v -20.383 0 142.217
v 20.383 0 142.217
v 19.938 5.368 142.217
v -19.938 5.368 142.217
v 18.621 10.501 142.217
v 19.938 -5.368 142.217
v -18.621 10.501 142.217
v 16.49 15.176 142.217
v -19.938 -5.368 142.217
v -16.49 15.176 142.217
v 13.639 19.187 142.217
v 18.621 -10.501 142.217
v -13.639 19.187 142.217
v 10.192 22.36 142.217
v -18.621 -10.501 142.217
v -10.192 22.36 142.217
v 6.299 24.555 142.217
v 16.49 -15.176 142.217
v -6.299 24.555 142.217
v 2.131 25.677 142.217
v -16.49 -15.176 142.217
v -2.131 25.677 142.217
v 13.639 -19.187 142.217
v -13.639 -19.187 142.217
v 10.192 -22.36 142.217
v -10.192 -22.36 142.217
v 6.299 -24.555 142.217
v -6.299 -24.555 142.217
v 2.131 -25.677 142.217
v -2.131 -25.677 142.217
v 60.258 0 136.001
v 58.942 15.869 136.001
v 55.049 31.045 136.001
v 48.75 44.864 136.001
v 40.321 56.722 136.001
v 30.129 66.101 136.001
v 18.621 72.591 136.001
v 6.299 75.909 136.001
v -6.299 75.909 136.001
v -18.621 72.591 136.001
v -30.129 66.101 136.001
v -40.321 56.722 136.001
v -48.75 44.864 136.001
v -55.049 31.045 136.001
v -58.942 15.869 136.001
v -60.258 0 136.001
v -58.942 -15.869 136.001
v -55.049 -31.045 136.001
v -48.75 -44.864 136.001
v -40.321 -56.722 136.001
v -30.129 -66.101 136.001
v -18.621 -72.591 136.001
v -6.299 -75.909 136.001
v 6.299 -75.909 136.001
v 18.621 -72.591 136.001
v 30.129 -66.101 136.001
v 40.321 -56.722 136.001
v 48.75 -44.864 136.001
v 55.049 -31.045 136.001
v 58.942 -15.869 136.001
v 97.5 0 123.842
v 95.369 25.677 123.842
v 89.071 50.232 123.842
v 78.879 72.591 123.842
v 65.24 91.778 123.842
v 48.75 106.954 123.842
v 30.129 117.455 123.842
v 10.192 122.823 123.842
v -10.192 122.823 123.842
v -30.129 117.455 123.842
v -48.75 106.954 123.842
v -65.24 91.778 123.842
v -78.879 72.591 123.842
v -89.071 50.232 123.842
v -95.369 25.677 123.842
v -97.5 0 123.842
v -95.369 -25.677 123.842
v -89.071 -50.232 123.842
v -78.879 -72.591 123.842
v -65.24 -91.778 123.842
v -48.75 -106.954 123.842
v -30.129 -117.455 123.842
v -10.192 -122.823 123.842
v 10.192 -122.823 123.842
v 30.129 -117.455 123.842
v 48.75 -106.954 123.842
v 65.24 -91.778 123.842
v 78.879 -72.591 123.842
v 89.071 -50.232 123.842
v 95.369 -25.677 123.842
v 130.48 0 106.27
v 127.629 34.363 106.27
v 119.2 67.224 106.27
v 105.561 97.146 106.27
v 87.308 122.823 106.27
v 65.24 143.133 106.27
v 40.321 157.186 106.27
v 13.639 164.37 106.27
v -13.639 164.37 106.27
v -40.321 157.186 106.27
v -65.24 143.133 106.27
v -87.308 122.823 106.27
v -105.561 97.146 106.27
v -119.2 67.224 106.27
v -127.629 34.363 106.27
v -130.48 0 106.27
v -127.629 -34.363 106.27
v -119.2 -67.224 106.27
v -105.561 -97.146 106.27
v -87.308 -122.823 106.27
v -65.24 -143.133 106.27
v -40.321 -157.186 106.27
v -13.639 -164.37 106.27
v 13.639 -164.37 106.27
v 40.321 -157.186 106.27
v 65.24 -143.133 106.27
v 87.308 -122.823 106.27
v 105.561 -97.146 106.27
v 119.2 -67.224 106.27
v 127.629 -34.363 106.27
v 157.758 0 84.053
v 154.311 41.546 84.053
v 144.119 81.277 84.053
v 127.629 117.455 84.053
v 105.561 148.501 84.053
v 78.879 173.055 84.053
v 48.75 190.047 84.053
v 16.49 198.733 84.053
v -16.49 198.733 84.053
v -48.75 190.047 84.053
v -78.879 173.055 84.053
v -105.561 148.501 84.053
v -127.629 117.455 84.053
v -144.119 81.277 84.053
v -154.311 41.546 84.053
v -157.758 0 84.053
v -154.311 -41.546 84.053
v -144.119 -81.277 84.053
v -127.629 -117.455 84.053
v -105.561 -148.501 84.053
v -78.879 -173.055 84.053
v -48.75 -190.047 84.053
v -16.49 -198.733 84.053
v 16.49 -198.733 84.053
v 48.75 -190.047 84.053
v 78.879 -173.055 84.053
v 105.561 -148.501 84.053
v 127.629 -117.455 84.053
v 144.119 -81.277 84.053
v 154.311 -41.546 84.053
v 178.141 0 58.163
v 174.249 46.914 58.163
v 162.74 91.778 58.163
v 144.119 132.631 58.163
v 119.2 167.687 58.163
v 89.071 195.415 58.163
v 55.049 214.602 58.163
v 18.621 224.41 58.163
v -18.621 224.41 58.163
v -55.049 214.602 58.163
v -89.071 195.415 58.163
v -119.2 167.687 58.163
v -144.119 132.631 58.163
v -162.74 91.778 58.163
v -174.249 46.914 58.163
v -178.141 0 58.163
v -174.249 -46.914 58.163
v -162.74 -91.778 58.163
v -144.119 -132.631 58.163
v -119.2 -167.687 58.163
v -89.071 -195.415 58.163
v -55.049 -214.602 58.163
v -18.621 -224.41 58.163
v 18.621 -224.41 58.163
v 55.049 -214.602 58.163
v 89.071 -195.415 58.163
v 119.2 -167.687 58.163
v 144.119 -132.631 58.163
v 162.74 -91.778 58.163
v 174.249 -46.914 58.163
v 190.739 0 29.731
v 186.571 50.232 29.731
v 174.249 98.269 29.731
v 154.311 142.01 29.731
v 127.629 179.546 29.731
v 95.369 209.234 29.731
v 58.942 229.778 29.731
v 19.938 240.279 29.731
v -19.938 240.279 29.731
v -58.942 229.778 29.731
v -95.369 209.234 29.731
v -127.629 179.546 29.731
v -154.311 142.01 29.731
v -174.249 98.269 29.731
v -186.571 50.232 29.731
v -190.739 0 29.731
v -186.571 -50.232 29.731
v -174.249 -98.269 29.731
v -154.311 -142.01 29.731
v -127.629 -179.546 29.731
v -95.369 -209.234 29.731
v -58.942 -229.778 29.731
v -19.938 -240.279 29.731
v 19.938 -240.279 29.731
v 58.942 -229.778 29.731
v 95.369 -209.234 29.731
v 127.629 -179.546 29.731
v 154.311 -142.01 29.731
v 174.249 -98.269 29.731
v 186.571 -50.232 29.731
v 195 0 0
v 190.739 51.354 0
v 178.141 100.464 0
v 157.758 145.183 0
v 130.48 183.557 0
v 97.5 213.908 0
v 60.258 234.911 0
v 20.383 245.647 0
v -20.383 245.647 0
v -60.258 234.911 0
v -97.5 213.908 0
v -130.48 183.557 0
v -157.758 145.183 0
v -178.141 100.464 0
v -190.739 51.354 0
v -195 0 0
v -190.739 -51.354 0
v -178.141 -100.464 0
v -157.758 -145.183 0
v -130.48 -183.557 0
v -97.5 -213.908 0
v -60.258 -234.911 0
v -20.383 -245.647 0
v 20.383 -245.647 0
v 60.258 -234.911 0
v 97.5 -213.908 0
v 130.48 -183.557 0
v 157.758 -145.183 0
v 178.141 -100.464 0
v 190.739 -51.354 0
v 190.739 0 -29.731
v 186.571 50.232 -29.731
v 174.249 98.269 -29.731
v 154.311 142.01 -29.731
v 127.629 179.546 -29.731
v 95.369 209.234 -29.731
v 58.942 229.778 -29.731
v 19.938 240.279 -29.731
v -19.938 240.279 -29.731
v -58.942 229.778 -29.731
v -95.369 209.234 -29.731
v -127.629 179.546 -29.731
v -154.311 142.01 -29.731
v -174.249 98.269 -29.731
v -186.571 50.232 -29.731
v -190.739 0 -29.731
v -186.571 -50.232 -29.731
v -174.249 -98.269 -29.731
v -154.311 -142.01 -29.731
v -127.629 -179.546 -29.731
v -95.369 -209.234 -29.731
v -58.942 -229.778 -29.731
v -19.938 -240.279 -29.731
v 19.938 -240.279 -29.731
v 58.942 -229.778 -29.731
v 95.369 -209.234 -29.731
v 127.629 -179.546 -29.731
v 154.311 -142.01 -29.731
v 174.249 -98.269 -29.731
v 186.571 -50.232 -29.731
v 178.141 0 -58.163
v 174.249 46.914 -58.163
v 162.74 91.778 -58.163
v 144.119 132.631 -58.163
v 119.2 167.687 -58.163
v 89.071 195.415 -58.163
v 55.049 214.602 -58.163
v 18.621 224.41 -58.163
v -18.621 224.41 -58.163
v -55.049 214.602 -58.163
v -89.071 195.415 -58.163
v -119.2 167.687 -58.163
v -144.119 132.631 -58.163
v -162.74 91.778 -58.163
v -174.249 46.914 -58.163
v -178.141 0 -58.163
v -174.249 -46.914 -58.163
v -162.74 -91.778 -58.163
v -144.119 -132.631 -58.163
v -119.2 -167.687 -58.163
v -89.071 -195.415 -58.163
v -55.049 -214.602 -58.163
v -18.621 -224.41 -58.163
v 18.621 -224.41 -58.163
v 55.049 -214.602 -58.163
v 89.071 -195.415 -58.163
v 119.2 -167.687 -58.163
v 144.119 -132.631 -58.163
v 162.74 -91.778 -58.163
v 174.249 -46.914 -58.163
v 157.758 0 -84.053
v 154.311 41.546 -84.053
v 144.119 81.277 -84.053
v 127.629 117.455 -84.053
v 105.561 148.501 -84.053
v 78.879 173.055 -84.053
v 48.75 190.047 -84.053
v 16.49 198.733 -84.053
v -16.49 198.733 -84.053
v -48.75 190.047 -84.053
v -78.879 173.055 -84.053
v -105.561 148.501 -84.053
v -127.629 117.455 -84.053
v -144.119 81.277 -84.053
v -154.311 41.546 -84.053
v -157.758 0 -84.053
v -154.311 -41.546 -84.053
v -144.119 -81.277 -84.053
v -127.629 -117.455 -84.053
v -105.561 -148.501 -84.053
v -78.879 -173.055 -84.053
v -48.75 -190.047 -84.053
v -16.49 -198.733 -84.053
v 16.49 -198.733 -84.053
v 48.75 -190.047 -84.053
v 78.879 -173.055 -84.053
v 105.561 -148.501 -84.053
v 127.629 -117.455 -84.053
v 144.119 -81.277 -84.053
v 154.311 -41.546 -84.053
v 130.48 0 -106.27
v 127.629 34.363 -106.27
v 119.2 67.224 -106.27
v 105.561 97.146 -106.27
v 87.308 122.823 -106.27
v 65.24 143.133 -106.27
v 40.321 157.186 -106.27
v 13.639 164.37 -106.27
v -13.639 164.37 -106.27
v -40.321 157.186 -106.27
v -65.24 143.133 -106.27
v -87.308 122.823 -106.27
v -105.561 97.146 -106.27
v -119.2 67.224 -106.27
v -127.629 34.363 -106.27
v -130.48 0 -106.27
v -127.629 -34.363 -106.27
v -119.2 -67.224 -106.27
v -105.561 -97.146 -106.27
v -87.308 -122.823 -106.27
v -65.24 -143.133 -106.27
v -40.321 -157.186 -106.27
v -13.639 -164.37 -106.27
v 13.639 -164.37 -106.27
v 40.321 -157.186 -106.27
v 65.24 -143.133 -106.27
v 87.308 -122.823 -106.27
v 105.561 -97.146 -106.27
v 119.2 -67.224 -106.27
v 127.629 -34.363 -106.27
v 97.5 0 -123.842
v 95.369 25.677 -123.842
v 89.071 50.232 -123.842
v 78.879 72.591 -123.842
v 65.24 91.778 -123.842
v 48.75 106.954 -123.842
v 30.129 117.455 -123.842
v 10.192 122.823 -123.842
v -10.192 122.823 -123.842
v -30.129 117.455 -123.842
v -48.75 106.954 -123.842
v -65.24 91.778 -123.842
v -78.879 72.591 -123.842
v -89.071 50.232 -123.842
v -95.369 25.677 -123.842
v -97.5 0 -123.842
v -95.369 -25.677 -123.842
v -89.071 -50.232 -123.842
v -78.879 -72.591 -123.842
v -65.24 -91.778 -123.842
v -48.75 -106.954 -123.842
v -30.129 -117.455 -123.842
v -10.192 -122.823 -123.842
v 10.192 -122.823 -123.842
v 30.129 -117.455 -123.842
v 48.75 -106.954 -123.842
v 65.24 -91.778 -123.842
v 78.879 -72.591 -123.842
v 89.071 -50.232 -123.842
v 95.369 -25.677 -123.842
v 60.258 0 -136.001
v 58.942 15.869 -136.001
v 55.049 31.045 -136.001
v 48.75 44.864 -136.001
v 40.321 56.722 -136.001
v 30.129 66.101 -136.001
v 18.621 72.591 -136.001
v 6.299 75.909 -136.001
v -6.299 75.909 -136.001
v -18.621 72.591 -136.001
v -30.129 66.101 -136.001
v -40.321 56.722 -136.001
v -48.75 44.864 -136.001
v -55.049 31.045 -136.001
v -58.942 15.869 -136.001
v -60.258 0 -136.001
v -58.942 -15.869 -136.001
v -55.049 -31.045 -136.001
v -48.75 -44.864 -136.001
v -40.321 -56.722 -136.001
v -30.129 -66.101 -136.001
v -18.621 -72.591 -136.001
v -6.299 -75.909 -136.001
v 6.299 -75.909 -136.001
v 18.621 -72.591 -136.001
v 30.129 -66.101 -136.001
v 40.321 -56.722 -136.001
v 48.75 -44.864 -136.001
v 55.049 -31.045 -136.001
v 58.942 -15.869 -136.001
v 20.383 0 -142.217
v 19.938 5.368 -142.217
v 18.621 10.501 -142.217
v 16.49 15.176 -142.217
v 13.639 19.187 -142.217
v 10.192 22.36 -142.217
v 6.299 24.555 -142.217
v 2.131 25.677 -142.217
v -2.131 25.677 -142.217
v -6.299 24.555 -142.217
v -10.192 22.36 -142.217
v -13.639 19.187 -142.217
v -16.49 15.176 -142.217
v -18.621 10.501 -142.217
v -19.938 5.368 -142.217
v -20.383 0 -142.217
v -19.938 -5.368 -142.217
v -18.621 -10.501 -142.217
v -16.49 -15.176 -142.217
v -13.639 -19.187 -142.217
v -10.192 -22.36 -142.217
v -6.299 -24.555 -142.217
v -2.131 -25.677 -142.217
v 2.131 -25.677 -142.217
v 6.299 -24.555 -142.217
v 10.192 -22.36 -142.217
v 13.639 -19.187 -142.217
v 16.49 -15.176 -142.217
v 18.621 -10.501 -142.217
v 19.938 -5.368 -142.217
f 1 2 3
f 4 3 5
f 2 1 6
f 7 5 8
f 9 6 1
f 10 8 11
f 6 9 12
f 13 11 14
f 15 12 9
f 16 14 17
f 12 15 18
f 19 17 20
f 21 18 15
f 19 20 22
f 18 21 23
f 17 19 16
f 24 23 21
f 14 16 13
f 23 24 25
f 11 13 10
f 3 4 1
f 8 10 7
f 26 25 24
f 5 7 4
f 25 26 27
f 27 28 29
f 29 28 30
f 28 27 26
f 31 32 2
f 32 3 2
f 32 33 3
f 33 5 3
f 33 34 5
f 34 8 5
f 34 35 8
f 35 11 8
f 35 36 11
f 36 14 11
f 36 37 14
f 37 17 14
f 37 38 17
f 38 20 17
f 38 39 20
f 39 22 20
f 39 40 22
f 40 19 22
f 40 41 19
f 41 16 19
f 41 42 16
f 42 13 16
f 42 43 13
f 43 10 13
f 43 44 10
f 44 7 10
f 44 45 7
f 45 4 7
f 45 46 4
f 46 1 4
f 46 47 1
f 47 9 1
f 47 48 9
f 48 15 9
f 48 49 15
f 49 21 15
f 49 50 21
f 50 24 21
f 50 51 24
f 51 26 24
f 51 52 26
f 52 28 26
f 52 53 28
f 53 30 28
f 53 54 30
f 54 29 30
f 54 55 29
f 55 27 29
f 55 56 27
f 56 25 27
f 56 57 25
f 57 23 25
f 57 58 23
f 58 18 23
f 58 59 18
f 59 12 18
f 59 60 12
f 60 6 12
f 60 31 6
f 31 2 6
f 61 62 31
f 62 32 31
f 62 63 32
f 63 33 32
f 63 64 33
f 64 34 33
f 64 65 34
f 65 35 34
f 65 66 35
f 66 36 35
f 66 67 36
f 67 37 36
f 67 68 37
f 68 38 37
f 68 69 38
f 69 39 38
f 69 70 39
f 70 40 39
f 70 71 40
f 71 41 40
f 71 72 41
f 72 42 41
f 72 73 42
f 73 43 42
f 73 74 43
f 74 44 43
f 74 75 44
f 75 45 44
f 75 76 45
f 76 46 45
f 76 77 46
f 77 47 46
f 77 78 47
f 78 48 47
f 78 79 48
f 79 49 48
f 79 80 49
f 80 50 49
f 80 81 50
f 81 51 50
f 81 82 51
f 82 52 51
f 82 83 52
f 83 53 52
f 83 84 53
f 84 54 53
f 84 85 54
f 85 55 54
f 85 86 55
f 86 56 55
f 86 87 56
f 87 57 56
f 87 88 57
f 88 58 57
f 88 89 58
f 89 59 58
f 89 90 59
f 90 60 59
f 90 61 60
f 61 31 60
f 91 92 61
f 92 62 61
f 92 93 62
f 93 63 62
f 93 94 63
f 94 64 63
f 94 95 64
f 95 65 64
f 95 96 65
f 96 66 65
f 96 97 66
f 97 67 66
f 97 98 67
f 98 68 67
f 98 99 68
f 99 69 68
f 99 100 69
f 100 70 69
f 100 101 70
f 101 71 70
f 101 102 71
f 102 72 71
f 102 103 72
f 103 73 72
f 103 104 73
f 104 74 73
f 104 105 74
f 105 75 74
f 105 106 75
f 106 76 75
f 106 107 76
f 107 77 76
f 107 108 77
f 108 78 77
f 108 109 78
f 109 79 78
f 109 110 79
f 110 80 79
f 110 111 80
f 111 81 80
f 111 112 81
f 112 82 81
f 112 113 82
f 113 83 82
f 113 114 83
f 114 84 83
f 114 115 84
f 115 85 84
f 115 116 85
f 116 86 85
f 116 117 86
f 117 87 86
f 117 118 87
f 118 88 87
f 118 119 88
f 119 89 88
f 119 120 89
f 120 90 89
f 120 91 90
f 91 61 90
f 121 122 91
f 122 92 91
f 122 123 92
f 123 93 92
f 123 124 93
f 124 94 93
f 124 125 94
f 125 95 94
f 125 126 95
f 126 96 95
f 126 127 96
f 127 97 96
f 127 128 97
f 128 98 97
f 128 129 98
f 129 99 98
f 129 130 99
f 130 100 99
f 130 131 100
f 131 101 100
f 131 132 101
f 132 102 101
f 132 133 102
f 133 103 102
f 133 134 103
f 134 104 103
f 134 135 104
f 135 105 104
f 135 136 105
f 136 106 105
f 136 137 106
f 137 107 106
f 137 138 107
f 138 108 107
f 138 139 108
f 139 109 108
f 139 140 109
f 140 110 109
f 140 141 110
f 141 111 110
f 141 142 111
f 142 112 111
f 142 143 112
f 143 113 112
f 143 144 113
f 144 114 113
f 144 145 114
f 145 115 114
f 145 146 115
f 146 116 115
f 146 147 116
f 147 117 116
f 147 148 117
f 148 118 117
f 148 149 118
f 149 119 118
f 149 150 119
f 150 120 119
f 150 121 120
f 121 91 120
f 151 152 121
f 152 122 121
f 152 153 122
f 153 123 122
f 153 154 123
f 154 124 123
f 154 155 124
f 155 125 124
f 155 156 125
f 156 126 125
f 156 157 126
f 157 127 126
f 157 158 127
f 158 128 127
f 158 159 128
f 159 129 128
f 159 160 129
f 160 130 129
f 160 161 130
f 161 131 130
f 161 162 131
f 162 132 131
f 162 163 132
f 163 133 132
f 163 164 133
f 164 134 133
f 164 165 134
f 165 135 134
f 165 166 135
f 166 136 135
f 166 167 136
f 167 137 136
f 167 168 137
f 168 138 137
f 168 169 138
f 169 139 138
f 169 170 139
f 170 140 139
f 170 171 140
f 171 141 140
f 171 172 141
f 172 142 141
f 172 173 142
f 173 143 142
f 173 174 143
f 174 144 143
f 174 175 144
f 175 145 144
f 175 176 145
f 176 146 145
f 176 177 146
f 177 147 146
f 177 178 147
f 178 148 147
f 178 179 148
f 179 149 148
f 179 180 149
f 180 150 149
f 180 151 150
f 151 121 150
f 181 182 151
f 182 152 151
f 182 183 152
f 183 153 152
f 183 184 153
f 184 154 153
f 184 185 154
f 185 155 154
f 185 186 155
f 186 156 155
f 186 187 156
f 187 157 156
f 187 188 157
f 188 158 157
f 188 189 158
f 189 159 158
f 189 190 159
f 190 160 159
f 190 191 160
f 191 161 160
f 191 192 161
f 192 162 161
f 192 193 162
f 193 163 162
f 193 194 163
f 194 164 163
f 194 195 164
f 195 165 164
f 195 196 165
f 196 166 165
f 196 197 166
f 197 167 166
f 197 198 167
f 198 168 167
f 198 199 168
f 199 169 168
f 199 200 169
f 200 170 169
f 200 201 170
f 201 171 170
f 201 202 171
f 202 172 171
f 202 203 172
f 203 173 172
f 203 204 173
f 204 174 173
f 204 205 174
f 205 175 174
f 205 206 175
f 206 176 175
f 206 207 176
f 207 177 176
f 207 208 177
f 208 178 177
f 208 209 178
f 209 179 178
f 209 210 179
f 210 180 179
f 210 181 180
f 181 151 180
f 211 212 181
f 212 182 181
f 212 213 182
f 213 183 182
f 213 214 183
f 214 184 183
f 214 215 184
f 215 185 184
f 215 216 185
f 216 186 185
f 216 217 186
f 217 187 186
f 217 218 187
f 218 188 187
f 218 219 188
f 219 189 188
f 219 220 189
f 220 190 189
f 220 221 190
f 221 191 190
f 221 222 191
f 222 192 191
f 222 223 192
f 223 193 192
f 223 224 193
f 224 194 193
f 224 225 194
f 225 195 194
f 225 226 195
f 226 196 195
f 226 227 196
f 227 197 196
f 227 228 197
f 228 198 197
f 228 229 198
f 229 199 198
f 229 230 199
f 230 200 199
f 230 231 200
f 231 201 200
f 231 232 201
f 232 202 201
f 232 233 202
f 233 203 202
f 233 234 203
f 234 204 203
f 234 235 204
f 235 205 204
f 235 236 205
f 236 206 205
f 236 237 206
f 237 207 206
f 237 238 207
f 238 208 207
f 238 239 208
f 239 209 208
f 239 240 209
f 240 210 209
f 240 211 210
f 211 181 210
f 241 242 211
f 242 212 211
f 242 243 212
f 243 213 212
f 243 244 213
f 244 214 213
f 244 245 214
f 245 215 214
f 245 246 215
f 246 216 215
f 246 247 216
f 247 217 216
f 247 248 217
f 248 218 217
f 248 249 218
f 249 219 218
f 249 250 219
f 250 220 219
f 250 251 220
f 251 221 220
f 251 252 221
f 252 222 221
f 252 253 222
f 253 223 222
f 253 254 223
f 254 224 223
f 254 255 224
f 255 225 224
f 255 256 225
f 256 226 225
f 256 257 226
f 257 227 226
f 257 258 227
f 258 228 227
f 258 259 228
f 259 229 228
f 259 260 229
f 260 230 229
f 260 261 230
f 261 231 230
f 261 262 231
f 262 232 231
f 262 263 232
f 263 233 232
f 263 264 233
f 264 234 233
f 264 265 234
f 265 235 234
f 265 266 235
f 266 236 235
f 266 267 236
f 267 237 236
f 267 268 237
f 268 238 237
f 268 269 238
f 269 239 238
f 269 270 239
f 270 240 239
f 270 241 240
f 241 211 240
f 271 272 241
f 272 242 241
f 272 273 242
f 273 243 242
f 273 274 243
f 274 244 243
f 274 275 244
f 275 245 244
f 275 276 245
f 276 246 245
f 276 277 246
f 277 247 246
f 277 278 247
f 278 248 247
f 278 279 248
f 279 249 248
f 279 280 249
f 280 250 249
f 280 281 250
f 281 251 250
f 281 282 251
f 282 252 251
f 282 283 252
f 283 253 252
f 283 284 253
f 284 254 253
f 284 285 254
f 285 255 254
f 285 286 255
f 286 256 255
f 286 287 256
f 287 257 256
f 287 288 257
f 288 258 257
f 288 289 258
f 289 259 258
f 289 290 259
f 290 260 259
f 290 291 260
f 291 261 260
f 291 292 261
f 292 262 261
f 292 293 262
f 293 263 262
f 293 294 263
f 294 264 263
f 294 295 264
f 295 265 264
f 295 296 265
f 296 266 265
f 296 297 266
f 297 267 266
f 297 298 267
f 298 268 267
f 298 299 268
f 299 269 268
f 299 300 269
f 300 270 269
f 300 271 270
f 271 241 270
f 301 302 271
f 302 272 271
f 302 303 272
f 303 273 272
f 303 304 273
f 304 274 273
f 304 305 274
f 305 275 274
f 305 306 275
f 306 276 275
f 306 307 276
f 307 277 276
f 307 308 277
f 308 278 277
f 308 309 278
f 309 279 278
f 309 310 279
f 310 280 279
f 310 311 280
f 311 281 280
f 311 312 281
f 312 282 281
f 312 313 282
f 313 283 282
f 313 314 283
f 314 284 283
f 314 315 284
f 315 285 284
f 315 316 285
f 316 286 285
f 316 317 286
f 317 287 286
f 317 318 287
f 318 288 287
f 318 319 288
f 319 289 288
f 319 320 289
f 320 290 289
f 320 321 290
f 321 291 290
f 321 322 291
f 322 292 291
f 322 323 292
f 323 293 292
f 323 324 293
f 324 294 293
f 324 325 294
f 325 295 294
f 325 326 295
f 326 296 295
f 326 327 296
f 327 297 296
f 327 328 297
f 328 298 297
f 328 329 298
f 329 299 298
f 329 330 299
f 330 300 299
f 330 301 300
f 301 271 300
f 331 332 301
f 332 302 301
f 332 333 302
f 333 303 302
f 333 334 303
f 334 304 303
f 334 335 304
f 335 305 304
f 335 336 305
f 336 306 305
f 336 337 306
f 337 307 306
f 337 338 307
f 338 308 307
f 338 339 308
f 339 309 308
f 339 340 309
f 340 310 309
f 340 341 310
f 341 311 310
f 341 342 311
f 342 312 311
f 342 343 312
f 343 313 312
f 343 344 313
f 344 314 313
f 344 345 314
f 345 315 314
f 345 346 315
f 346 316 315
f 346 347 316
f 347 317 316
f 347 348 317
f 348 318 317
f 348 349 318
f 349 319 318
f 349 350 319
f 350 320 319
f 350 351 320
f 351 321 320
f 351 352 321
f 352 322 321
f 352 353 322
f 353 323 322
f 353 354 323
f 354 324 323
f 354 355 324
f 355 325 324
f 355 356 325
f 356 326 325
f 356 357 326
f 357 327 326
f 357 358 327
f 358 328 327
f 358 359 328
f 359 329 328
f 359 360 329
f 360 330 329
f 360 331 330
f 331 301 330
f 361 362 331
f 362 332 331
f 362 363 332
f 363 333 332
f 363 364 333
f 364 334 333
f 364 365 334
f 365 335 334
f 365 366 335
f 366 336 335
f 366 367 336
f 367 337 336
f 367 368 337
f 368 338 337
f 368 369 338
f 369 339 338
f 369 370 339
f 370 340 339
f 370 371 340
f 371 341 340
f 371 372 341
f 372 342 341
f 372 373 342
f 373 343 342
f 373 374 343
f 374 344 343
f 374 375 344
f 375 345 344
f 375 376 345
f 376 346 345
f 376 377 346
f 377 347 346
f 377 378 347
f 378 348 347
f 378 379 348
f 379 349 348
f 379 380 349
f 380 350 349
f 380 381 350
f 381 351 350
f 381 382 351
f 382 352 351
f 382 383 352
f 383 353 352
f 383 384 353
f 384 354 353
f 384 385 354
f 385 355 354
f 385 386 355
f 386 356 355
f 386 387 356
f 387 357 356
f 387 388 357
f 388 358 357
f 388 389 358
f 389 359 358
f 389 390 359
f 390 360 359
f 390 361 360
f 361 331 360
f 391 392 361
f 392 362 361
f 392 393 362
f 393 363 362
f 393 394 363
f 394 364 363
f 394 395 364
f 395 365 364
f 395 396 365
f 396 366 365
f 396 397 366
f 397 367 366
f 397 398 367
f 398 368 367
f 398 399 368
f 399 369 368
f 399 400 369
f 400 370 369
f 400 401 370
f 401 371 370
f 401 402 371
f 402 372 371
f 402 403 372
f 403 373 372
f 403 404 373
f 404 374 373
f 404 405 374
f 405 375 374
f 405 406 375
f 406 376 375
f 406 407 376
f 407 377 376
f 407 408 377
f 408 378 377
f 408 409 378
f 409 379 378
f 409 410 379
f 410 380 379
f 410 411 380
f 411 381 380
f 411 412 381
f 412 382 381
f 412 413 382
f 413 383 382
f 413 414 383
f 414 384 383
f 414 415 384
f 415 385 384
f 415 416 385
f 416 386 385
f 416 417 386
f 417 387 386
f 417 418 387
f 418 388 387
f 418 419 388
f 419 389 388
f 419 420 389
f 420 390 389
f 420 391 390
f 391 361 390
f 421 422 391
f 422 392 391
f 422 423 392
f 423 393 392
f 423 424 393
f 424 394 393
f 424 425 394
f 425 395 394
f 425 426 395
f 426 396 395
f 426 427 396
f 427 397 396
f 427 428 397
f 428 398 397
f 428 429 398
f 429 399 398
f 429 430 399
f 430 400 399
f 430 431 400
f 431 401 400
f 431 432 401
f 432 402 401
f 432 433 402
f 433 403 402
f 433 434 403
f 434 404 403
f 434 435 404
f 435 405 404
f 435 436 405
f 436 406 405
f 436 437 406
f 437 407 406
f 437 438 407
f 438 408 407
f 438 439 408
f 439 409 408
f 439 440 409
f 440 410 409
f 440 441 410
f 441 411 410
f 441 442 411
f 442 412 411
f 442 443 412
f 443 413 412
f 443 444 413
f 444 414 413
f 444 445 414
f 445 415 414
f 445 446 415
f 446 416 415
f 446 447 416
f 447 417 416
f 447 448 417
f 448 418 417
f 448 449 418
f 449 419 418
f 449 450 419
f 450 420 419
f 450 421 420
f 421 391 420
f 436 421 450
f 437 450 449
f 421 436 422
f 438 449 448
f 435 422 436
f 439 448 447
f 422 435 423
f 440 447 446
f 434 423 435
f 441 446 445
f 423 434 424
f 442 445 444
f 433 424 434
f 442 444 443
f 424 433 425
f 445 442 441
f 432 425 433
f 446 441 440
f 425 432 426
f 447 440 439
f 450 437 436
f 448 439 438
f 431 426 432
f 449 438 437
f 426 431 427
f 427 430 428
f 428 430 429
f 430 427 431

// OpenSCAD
// Generated by SolidPython 1.0.1 on 2020-07-29 00:46:52


scale(v = [15, 19, 11]) {
	sphere(r = 13);
}
/***********************************************
*********      SolidPython code:      **********
************************************************
 
# import packages: SolidPython
from solid import *
from solid.utils import *
from itertools import chain, combinations, permutations


class Resize:

    def __init__(self, scad_file):
        self.scad_file = scad_file
        #self.scad_file = import_scad(scad_file)
        # cone/cylinder param:
        self.r1 = 0
        self.r2 = 0
        self.h = 0
        # rectangular prism param:
        self.w = 0
        self.l = 0
        # ellipse param:
        self.r = 0

    # import OpenScad code (file name corresponds to shape)


    # classify shape + parameters
    def assign(self, param1, param2, param3):
        if self.scad_file == 'cone.scad':
            self.r1 = param1
            self.r2 = param2
            self.h = param3
        elif self.scad_file == 'cylinder.scad':
            self.r1 = param1
            self.r2 = param2
            self.h = param3
        elif self.scad_file == 'rectangularPrism.scad':
            self.h = param1
            self.l = param2
            self.w = param3
        else:
            self.r = param1
            self.h = param2

    # resize parameters
    def iterate(self):
        x = range(3, 20, 2)
        i = 1
        if self.scad_file == 'cone.scad':
            tempList = list(permutations(x, 2))
            for temp in tempList:
                param1 = temp[0]
                param2 = temp[1]
                filepath = 'produced_scad_files/' + 'cone' + str(param1) + '_' + str(param2) + '_' + '.scad'
                scad_render_to_file(cylinder(h=param1, r1=param2, r2=0), filepath)

        elif self.scad_file == 'cylinder.scad':
            tempList = list(permutations(x, 3))
            for temp in tempList:
                param1 = temp[0]
                param2 = temp[1]
                filepath = 'produced_scad_files/' + 'cylinder' + str(param1) + '_' + str(param2) + '_' + '.scad'
                scad_render_to_file(cylinder(h=param1, r1=param2, r2=param2), filepath)

        elif self.scad_file == 'rectangularPrism.scad':
            tempList = list(permutations(x, 3))
            for temp in tempList:
                param1 = temp[0]
                param2 = temp[1]
                param3 = temp[2]
                filepath = 'produced_scad_files/' + 'rectangularPrism' + str(param1) + '_' + str(param2) + '_' + str(
                    param3) + '.scad'
                scad_render_to_file(cube(size=(param1, param2, param3)), filepath)

        elif self.scad_file == 'ellipse.scad':
            tempList = list(permutations(x, 4))
            for temp in tempList:
                param1 = temp[0]
                param2 = temp[1]
                param3 = temp[2]
                param4 = temp[3]
                filepath = 'produced_scad_files/' + 'ellipse' + str(param1) + '_' + str(param2) + '_' + str(param3) + '_' + str(param4) + '.scad'
                scad_render_to_file(scale([param1, param2, param3])(sphere(r=param4)), filepath)

    def render_to_scadfile(self):
        scad_render_to_file(scad, 'example.scad') 
 
************************************************/
